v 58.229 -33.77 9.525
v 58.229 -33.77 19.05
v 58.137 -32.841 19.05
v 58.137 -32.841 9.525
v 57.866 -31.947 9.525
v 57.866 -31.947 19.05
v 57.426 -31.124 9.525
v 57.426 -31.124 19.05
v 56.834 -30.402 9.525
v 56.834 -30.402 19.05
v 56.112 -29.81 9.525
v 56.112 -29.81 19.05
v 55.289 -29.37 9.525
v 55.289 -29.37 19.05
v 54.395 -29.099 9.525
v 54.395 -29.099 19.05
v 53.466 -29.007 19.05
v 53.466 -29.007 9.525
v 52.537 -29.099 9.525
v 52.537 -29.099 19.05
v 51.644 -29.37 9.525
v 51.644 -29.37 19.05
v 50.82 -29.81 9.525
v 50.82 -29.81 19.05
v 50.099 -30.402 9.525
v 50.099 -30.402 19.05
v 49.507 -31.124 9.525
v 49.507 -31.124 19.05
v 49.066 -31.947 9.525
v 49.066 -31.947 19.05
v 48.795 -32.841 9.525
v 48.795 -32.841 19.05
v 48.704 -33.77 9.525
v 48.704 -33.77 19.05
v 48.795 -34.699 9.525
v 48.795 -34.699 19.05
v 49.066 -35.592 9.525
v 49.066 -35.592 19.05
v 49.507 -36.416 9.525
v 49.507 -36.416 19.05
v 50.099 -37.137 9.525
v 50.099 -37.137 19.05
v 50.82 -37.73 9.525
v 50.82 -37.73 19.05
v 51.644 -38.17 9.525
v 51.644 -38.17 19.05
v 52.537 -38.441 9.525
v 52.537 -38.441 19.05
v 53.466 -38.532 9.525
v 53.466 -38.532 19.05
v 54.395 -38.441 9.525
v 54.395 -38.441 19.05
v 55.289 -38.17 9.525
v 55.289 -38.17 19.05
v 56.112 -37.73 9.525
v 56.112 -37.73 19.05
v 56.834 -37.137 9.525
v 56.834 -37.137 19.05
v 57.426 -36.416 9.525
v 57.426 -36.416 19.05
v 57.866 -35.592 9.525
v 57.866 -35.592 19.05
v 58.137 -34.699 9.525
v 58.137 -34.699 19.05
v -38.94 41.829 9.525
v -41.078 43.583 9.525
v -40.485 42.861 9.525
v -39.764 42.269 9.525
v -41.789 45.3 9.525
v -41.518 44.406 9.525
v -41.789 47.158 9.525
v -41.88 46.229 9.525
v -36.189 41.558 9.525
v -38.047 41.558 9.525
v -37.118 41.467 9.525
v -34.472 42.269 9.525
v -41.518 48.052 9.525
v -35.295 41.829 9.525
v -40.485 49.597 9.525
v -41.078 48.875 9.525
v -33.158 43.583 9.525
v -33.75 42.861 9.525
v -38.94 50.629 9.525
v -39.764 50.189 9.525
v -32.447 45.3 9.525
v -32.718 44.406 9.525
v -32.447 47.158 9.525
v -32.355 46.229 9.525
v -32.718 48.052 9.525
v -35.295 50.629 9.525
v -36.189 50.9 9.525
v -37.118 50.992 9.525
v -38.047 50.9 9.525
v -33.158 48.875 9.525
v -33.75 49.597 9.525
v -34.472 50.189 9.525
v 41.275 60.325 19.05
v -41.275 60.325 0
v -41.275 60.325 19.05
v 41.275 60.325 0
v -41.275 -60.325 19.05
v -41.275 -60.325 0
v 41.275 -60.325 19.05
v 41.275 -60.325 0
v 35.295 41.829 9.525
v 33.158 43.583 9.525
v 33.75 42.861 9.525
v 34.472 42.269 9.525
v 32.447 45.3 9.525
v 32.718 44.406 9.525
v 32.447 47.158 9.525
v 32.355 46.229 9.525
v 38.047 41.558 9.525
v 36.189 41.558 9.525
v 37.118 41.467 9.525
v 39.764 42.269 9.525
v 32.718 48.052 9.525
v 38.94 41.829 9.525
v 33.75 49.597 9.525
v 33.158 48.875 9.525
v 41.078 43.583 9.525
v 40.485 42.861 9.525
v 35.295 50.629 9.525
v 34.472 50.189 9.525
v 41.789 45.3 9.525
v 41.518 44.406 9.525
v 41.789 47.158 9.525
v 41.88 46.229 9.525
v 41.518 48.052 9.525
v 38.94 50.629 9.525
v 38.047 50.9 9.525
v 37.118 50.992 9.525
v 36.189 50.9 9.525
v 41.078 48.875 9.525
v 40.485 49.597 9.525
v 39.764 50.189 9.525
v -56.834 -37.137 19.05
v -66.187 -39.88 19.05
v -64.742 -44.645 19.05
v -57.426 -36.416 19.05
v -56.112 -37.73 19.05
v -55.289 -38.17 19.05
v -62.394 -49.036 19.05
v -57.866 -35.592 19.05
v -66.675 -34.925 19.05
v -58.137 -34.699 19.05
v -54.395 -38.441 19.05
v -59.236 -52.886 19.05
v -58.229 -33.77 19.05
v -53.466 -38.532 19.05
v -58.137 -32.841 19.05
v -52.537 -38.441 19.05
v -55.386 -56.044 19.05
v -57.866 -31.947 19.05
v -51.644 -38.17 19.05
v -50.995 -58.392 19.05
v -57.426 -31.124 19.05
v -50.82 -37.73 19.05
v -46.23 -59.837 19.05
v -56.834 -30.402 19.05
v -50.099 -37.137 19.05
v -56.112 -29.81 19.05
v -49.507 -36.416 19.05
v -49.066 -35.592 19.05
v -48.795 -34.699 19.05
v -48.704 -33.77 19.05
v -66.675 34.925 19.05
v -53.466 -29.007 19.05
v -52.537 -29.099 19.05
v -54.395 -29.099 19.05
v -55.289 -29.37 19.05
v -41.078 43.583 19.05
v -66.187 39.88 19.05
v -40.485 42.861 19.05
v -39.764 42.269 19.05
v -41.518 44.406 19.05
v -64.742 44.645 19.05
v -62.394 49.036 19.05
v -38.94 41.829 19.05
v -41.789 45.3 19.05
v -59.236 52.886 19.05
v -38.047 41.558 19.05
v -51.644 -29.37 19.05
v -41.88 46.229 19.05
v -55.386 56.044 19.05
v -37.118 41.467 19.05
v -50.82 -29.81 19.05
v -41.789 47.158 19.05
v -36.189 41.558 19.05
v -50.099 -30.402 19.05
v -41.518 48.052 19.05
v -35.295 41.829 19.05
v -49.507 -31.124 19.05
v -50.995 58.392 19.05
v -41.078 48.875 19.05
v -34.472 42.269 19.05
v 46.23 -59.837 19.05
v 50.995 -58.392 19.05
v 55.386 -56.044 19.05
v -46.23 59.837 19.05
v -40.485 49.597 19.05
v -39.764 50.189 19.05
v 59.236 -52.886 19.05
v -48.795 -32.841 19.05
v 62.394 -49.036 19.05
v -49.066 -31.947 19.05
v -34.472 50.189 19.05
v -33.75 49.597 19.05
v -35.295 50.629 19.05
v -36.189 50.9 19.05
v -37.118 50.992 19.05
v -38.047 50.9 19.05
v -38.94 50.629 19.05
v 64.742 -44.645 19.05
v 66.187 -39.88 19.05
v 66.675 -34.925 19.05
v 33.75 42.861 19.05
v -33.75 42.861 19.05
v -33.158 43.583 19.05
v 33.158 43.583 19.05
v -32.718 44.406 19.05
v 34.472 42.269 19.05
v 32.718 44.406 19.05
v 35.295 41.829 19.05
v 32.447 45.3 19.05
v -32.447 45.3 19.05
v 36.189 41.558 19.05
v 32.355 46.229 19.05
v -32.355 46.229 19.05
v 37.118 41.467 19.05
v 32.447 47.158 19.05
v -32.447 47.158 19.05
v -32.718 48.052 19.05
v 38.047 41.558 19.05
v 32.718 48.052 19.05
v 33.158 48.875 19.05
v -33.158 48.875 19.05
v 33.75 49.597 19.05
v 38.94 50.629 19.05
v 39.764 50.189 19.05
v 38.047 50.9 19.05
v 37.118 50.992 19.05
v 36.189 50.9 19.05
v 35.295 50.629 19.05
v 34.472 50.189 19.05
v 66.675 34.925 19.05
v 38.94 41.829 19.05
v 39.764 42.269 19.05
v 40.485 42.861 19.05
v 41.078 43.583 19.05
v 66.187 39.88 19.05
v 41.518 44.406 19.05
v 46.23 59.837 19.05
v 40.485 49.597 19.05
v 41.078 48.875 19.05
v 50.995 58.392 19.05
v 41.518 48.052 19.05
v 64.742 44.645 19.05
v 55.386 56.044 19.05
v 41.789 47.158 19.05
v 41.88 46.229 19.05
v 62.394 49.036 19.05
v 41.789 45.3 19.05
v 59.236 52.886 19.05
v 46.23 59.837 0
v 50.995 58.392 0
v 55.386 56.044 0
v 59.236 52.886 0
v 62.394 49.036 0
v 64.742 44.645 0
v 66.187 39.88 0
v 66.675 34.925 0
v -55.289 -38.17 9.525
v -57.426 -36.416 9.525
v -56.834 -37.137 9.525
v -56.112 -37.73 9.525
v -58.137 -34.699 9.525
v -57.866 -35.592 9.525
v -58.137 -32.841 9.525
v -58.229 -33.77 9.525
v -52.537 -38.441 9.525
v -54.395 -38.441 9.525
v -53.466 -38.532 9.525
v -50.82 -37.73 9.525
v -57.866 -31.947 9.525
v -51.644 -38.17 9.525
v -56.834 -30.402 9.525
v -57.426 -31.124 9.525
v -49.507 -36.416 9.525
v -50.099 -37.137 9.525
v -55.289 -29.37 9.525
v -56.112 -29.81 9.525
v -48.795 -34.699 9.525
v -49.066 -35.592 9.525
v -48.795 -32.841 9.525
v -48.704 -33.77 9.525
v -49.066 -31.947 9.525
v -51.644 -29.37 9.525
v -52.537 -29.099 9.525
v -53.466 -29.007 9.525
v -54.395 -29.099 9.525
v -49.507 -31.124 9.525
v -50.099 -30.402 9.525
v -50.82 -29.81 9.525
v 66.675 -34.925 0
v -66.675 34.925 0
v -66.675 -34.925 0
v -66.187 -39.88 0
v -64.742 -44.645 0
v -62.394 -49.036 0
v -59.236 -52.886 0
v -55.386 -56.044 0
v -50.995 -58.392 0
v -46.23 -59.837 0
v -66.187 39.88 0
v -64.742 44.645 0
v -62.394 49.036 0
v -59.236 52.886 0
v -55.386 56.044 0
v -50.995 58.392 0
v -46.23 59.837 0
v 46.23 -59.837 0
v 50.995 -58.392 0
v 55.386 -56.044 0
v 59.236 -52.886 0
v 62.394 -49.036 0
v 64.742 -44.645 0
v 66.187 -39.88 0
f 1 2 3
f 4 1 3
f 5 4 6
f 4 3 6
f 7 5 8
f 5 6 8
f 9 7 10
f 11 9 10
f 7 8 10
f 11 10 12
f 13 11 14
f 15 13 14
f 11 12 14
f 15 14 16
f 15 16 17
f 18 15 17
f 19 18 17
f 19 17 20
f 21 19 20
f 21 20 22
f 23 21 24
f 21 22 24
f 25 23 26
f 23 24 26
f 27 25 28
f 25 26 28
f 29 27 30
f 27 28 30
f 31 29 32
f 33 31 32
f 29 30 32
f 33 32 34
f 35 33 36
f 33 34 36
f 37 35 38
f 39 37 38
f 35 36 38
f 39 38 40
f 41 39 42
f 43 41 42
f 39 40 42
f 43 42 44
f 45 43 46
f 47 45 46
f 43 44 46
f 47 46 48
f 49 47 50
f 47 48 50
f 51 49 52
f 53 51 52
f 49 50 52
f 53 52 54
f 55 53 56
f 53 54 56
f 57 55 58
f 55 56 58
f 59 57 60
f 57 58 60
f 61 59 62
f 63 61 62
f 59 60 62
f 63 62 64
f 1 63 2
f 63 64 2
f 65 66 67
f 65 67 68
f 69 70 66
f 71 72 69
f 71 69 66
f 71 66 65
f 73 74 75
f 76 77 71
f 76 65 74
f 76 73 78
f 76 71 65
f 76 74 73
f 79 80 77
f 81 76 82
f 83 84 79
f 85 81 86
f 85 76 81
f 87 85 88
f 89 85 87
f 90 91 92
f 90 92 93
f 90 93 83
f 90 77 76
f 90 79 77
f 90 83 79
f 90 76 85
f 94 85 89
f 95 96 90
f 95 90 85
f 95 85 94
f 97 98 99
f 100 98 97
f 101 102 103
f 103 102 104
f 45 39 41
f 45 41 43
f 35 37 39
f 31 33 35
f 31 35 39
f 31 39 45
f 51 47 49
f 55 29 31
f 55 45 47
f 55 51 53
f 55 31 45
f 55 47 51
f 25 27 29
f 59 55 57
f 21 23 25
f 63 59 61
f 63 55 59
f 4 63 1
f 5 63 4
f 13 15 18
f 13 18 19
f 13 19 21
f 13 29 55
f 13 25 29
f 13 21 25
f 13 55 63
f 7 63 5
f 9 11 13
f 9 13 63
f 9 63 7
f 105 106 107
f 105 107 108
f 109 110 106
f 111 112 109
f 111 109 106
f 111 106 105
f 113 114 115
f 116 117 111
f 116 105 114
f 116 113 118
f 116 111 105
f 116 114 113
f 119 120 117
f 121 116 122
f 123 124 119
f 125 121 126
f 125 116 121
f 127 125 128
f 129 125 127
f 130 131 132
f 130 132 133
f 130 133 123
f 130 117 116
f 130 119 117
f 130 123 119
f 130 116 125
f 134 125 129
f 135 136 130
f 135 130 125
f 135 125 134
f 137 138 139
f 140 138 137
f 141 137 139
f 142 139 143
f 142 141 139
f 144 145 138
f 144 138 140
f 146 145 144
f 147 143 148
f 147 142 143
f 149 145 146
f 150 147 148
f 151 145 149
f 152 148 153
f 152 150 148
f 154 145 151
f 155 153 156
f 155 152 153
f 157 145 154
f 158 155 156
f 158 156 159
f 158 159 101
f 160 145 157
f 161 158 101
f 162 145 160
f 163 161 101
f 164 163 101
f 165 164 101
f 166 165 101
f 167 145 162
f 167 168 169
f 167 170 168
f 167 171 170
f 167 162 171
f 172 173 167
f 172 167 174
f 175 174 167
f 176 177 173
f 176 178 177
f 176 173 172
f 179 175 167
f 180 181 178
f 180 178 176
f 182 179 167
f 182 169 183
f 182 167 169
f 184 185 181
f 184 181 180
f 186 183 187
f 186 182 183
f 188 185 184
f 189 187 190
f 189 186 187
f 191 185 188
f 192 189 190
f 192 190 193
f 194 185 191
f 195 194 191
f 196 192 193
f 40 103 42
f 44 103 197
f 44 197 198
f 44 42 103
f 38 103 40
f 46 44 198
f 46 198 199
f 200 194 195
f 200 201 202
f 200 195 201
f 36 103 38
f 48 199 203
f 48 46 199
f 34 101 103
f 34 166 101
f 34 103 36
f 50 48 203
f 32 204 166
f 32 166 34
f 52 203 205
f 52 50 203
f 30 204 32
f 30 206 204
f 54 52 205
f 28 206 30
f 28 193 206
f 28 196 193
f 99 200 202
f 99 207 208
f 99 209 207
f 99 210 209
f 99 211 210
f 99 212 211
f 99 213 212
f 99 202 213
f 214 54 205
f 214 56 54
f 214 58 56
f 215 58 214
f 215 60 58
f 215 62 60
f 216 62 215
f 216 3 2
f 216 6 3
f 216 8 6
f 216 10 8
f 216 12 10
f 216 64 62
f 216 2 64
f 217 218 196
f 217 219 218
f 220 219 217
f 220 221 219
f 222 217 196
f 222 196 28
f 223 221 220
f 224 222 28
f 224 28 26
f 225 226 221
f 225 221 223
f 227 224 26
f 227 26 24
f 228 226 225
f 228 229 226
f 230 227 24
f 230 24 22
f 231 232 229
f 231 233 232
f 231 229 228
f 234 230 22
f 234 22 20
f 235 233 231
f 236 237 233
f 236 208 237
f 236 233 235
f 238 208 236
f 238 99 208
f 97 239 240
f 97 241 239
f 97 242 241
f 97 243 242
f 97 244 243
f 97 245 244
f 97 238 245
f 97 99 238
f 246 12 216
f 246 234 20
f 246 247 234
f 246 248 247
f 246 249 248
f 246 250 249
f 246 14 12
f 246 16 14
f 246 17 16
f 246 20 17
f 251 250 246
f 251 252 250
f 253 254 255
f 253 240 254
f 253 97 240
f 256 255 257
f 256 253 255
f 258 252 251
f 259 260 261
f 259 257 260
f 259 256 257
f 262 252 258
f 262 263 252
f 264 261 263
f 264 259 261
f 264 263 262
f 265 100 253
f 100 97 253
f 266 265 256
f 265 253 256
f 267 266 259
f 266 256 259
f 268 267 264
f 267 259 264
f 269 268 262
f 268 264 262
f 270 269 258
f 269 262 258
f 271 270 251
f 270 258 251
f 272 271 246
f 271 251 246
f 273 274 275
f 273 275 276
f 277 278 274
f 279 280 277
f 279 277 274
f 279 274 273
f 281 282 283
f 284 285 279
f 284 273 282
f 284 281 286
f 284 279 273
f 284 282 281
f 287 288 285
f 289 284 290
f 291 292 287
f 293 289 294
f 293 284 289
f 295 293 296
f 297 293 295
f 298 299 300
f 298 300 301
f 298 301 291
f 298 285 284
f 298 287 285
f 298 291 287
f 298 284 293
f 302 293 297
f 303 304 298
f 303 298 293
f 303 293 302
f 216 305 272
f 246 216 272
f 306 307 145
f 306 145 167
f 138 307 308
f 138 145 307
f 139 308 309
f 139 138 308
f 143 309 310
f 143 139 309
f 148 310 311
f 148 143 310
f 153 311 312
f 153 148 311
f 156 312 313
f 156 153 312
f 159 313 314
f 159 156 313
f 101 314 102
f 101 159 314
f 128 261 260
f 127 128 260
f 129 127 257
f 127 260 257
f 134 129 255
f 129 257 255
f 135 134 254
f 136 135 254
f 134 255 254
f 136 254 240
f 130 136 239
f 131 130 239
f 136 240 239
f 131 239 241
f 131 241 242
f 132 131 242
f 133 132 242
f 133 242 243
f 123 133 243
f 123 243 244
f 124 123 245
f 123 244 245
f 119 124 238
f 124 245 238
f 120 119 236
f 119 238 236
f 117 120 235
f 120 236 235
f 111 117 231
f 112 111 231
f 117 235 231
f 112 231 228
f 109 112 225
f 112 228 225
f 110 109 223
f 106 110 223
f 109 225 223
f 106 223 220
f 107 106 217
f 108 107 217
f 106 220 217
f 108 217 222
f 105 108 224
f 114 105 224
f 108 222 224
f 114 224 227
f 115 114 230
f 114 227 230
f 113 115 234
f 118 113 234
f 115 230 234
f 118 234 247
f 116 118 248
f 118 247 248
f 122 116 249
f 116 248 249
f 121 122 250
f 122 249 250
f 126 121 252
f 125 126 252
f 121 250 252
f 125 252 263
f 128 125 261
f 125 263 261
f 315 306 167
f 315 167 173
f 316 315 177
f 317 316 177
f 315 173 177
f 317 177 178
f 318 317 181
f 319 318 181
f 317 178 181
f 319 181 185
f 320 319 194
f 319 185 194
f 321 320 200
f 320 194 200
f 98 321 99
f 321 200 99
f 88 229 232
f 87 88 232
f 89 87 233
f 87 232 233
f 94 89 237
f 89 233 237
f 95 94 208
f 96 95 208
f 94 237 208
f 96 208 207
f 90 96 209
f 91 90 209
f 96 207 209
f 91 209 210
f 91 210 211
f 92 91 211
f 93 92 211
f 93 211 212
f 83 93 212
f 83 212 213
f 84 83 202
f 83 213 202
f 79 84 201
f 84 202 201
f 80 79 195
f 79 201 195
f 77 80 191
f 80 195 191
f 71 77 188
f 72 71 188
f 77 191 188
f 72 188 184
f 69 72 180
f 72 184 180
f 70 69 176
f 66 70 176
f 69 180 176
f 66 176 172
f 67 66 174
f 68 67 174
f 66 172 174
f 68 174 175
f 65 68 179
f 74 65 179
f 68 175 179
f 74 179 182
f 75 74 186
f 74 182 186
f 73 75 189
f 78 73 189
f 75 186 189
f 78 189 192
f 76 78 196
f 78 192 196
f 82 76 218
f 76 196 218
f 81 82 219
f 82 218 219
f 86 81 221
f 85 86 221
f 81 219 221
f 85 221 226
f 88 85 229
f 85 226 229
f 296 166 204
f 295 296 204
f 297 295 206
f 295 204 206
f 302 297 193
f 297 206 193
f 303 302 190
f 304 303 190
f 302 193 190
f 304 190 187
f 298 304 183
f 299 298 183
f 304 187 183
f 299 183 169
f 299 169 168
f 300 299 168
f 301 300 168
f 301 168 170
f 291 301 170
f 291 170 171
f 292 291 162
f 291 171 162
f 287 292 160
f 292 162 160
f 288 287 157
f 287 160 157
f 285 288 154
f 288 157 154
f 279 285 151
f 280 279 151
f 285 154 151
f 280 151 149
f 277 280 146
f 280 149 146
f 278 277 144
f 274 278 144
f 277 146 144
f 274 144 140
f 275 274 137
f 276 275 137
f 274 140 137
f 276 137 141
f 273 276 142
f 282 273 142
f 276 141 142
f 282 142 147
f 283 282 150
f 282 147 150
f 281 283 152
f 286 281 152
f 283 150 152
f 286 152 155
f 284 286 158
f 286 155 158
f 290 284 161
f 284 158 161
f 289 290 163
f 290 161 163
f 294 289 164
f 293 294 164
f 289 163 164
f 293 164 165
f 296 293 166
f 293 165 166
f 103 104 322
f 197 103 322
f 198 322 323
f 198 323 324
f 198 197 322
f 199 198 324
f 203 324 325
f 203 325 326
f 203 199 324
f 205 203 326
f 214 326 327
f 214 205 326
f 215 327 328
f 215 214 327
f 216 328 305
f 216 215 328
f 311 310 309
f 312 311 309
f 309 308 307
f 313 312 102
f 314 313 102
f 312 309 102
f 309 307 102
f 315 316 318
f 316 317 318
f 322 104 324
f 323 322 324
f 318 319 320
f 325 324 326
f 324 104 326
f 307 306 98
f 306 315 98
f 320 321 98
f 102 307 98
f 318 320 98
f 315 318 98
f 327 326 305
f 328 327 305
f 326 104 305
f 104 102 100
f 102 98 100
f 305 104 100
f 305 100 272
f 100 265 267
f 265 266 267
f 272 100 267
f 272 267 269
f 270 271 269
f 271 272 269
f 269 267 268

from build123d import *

# Parameters (mm, degrees)
F0_W     = 133.35
F0_H     = 120.65
F1_DEPTH = 19.05
F2_R     = 4.7625
F3_DEPTH = 9.525
F4_R     = 25.4


with BuildPart() as f1:
    # F0 (on Top) → F1 (new body)
    with BuildSketch(Plane.XY):
        Rectangle(F0_W, F0_H)
    extrude(amount=F1_DEPTH)

    # F2 (on face) → F3 (cut)
    with BuildSketch(Plane.XY.offset(19.05)):
        with Locations((-37.11785, 46.229012)):
            Circle(F2_R)
        with Locations((-53.46638, -33.769809)):
            Circle(F2_R)
        with Locations((37.11785, 46.229012)):
            Circle(F2_R)
        with Locations((53.46638, -33.769809)):
            Circle(F2_R)
    extrude(amount=-F3_DEPTH, mode=Mode.SUBTRACT)

    # F4
    f4_edges = [f1.edges().sort_by_distance(p)[0] for p in [
        (66.675, 60.325, 9.525),
        (66.675, -60.325, 9.525),
        (-66.675, -60.325, 9.525),
        (-66.675, 60.325, 9.525),
    ]]
    fillet(f4_edges, radius=F4_R)


solid = f1.part
